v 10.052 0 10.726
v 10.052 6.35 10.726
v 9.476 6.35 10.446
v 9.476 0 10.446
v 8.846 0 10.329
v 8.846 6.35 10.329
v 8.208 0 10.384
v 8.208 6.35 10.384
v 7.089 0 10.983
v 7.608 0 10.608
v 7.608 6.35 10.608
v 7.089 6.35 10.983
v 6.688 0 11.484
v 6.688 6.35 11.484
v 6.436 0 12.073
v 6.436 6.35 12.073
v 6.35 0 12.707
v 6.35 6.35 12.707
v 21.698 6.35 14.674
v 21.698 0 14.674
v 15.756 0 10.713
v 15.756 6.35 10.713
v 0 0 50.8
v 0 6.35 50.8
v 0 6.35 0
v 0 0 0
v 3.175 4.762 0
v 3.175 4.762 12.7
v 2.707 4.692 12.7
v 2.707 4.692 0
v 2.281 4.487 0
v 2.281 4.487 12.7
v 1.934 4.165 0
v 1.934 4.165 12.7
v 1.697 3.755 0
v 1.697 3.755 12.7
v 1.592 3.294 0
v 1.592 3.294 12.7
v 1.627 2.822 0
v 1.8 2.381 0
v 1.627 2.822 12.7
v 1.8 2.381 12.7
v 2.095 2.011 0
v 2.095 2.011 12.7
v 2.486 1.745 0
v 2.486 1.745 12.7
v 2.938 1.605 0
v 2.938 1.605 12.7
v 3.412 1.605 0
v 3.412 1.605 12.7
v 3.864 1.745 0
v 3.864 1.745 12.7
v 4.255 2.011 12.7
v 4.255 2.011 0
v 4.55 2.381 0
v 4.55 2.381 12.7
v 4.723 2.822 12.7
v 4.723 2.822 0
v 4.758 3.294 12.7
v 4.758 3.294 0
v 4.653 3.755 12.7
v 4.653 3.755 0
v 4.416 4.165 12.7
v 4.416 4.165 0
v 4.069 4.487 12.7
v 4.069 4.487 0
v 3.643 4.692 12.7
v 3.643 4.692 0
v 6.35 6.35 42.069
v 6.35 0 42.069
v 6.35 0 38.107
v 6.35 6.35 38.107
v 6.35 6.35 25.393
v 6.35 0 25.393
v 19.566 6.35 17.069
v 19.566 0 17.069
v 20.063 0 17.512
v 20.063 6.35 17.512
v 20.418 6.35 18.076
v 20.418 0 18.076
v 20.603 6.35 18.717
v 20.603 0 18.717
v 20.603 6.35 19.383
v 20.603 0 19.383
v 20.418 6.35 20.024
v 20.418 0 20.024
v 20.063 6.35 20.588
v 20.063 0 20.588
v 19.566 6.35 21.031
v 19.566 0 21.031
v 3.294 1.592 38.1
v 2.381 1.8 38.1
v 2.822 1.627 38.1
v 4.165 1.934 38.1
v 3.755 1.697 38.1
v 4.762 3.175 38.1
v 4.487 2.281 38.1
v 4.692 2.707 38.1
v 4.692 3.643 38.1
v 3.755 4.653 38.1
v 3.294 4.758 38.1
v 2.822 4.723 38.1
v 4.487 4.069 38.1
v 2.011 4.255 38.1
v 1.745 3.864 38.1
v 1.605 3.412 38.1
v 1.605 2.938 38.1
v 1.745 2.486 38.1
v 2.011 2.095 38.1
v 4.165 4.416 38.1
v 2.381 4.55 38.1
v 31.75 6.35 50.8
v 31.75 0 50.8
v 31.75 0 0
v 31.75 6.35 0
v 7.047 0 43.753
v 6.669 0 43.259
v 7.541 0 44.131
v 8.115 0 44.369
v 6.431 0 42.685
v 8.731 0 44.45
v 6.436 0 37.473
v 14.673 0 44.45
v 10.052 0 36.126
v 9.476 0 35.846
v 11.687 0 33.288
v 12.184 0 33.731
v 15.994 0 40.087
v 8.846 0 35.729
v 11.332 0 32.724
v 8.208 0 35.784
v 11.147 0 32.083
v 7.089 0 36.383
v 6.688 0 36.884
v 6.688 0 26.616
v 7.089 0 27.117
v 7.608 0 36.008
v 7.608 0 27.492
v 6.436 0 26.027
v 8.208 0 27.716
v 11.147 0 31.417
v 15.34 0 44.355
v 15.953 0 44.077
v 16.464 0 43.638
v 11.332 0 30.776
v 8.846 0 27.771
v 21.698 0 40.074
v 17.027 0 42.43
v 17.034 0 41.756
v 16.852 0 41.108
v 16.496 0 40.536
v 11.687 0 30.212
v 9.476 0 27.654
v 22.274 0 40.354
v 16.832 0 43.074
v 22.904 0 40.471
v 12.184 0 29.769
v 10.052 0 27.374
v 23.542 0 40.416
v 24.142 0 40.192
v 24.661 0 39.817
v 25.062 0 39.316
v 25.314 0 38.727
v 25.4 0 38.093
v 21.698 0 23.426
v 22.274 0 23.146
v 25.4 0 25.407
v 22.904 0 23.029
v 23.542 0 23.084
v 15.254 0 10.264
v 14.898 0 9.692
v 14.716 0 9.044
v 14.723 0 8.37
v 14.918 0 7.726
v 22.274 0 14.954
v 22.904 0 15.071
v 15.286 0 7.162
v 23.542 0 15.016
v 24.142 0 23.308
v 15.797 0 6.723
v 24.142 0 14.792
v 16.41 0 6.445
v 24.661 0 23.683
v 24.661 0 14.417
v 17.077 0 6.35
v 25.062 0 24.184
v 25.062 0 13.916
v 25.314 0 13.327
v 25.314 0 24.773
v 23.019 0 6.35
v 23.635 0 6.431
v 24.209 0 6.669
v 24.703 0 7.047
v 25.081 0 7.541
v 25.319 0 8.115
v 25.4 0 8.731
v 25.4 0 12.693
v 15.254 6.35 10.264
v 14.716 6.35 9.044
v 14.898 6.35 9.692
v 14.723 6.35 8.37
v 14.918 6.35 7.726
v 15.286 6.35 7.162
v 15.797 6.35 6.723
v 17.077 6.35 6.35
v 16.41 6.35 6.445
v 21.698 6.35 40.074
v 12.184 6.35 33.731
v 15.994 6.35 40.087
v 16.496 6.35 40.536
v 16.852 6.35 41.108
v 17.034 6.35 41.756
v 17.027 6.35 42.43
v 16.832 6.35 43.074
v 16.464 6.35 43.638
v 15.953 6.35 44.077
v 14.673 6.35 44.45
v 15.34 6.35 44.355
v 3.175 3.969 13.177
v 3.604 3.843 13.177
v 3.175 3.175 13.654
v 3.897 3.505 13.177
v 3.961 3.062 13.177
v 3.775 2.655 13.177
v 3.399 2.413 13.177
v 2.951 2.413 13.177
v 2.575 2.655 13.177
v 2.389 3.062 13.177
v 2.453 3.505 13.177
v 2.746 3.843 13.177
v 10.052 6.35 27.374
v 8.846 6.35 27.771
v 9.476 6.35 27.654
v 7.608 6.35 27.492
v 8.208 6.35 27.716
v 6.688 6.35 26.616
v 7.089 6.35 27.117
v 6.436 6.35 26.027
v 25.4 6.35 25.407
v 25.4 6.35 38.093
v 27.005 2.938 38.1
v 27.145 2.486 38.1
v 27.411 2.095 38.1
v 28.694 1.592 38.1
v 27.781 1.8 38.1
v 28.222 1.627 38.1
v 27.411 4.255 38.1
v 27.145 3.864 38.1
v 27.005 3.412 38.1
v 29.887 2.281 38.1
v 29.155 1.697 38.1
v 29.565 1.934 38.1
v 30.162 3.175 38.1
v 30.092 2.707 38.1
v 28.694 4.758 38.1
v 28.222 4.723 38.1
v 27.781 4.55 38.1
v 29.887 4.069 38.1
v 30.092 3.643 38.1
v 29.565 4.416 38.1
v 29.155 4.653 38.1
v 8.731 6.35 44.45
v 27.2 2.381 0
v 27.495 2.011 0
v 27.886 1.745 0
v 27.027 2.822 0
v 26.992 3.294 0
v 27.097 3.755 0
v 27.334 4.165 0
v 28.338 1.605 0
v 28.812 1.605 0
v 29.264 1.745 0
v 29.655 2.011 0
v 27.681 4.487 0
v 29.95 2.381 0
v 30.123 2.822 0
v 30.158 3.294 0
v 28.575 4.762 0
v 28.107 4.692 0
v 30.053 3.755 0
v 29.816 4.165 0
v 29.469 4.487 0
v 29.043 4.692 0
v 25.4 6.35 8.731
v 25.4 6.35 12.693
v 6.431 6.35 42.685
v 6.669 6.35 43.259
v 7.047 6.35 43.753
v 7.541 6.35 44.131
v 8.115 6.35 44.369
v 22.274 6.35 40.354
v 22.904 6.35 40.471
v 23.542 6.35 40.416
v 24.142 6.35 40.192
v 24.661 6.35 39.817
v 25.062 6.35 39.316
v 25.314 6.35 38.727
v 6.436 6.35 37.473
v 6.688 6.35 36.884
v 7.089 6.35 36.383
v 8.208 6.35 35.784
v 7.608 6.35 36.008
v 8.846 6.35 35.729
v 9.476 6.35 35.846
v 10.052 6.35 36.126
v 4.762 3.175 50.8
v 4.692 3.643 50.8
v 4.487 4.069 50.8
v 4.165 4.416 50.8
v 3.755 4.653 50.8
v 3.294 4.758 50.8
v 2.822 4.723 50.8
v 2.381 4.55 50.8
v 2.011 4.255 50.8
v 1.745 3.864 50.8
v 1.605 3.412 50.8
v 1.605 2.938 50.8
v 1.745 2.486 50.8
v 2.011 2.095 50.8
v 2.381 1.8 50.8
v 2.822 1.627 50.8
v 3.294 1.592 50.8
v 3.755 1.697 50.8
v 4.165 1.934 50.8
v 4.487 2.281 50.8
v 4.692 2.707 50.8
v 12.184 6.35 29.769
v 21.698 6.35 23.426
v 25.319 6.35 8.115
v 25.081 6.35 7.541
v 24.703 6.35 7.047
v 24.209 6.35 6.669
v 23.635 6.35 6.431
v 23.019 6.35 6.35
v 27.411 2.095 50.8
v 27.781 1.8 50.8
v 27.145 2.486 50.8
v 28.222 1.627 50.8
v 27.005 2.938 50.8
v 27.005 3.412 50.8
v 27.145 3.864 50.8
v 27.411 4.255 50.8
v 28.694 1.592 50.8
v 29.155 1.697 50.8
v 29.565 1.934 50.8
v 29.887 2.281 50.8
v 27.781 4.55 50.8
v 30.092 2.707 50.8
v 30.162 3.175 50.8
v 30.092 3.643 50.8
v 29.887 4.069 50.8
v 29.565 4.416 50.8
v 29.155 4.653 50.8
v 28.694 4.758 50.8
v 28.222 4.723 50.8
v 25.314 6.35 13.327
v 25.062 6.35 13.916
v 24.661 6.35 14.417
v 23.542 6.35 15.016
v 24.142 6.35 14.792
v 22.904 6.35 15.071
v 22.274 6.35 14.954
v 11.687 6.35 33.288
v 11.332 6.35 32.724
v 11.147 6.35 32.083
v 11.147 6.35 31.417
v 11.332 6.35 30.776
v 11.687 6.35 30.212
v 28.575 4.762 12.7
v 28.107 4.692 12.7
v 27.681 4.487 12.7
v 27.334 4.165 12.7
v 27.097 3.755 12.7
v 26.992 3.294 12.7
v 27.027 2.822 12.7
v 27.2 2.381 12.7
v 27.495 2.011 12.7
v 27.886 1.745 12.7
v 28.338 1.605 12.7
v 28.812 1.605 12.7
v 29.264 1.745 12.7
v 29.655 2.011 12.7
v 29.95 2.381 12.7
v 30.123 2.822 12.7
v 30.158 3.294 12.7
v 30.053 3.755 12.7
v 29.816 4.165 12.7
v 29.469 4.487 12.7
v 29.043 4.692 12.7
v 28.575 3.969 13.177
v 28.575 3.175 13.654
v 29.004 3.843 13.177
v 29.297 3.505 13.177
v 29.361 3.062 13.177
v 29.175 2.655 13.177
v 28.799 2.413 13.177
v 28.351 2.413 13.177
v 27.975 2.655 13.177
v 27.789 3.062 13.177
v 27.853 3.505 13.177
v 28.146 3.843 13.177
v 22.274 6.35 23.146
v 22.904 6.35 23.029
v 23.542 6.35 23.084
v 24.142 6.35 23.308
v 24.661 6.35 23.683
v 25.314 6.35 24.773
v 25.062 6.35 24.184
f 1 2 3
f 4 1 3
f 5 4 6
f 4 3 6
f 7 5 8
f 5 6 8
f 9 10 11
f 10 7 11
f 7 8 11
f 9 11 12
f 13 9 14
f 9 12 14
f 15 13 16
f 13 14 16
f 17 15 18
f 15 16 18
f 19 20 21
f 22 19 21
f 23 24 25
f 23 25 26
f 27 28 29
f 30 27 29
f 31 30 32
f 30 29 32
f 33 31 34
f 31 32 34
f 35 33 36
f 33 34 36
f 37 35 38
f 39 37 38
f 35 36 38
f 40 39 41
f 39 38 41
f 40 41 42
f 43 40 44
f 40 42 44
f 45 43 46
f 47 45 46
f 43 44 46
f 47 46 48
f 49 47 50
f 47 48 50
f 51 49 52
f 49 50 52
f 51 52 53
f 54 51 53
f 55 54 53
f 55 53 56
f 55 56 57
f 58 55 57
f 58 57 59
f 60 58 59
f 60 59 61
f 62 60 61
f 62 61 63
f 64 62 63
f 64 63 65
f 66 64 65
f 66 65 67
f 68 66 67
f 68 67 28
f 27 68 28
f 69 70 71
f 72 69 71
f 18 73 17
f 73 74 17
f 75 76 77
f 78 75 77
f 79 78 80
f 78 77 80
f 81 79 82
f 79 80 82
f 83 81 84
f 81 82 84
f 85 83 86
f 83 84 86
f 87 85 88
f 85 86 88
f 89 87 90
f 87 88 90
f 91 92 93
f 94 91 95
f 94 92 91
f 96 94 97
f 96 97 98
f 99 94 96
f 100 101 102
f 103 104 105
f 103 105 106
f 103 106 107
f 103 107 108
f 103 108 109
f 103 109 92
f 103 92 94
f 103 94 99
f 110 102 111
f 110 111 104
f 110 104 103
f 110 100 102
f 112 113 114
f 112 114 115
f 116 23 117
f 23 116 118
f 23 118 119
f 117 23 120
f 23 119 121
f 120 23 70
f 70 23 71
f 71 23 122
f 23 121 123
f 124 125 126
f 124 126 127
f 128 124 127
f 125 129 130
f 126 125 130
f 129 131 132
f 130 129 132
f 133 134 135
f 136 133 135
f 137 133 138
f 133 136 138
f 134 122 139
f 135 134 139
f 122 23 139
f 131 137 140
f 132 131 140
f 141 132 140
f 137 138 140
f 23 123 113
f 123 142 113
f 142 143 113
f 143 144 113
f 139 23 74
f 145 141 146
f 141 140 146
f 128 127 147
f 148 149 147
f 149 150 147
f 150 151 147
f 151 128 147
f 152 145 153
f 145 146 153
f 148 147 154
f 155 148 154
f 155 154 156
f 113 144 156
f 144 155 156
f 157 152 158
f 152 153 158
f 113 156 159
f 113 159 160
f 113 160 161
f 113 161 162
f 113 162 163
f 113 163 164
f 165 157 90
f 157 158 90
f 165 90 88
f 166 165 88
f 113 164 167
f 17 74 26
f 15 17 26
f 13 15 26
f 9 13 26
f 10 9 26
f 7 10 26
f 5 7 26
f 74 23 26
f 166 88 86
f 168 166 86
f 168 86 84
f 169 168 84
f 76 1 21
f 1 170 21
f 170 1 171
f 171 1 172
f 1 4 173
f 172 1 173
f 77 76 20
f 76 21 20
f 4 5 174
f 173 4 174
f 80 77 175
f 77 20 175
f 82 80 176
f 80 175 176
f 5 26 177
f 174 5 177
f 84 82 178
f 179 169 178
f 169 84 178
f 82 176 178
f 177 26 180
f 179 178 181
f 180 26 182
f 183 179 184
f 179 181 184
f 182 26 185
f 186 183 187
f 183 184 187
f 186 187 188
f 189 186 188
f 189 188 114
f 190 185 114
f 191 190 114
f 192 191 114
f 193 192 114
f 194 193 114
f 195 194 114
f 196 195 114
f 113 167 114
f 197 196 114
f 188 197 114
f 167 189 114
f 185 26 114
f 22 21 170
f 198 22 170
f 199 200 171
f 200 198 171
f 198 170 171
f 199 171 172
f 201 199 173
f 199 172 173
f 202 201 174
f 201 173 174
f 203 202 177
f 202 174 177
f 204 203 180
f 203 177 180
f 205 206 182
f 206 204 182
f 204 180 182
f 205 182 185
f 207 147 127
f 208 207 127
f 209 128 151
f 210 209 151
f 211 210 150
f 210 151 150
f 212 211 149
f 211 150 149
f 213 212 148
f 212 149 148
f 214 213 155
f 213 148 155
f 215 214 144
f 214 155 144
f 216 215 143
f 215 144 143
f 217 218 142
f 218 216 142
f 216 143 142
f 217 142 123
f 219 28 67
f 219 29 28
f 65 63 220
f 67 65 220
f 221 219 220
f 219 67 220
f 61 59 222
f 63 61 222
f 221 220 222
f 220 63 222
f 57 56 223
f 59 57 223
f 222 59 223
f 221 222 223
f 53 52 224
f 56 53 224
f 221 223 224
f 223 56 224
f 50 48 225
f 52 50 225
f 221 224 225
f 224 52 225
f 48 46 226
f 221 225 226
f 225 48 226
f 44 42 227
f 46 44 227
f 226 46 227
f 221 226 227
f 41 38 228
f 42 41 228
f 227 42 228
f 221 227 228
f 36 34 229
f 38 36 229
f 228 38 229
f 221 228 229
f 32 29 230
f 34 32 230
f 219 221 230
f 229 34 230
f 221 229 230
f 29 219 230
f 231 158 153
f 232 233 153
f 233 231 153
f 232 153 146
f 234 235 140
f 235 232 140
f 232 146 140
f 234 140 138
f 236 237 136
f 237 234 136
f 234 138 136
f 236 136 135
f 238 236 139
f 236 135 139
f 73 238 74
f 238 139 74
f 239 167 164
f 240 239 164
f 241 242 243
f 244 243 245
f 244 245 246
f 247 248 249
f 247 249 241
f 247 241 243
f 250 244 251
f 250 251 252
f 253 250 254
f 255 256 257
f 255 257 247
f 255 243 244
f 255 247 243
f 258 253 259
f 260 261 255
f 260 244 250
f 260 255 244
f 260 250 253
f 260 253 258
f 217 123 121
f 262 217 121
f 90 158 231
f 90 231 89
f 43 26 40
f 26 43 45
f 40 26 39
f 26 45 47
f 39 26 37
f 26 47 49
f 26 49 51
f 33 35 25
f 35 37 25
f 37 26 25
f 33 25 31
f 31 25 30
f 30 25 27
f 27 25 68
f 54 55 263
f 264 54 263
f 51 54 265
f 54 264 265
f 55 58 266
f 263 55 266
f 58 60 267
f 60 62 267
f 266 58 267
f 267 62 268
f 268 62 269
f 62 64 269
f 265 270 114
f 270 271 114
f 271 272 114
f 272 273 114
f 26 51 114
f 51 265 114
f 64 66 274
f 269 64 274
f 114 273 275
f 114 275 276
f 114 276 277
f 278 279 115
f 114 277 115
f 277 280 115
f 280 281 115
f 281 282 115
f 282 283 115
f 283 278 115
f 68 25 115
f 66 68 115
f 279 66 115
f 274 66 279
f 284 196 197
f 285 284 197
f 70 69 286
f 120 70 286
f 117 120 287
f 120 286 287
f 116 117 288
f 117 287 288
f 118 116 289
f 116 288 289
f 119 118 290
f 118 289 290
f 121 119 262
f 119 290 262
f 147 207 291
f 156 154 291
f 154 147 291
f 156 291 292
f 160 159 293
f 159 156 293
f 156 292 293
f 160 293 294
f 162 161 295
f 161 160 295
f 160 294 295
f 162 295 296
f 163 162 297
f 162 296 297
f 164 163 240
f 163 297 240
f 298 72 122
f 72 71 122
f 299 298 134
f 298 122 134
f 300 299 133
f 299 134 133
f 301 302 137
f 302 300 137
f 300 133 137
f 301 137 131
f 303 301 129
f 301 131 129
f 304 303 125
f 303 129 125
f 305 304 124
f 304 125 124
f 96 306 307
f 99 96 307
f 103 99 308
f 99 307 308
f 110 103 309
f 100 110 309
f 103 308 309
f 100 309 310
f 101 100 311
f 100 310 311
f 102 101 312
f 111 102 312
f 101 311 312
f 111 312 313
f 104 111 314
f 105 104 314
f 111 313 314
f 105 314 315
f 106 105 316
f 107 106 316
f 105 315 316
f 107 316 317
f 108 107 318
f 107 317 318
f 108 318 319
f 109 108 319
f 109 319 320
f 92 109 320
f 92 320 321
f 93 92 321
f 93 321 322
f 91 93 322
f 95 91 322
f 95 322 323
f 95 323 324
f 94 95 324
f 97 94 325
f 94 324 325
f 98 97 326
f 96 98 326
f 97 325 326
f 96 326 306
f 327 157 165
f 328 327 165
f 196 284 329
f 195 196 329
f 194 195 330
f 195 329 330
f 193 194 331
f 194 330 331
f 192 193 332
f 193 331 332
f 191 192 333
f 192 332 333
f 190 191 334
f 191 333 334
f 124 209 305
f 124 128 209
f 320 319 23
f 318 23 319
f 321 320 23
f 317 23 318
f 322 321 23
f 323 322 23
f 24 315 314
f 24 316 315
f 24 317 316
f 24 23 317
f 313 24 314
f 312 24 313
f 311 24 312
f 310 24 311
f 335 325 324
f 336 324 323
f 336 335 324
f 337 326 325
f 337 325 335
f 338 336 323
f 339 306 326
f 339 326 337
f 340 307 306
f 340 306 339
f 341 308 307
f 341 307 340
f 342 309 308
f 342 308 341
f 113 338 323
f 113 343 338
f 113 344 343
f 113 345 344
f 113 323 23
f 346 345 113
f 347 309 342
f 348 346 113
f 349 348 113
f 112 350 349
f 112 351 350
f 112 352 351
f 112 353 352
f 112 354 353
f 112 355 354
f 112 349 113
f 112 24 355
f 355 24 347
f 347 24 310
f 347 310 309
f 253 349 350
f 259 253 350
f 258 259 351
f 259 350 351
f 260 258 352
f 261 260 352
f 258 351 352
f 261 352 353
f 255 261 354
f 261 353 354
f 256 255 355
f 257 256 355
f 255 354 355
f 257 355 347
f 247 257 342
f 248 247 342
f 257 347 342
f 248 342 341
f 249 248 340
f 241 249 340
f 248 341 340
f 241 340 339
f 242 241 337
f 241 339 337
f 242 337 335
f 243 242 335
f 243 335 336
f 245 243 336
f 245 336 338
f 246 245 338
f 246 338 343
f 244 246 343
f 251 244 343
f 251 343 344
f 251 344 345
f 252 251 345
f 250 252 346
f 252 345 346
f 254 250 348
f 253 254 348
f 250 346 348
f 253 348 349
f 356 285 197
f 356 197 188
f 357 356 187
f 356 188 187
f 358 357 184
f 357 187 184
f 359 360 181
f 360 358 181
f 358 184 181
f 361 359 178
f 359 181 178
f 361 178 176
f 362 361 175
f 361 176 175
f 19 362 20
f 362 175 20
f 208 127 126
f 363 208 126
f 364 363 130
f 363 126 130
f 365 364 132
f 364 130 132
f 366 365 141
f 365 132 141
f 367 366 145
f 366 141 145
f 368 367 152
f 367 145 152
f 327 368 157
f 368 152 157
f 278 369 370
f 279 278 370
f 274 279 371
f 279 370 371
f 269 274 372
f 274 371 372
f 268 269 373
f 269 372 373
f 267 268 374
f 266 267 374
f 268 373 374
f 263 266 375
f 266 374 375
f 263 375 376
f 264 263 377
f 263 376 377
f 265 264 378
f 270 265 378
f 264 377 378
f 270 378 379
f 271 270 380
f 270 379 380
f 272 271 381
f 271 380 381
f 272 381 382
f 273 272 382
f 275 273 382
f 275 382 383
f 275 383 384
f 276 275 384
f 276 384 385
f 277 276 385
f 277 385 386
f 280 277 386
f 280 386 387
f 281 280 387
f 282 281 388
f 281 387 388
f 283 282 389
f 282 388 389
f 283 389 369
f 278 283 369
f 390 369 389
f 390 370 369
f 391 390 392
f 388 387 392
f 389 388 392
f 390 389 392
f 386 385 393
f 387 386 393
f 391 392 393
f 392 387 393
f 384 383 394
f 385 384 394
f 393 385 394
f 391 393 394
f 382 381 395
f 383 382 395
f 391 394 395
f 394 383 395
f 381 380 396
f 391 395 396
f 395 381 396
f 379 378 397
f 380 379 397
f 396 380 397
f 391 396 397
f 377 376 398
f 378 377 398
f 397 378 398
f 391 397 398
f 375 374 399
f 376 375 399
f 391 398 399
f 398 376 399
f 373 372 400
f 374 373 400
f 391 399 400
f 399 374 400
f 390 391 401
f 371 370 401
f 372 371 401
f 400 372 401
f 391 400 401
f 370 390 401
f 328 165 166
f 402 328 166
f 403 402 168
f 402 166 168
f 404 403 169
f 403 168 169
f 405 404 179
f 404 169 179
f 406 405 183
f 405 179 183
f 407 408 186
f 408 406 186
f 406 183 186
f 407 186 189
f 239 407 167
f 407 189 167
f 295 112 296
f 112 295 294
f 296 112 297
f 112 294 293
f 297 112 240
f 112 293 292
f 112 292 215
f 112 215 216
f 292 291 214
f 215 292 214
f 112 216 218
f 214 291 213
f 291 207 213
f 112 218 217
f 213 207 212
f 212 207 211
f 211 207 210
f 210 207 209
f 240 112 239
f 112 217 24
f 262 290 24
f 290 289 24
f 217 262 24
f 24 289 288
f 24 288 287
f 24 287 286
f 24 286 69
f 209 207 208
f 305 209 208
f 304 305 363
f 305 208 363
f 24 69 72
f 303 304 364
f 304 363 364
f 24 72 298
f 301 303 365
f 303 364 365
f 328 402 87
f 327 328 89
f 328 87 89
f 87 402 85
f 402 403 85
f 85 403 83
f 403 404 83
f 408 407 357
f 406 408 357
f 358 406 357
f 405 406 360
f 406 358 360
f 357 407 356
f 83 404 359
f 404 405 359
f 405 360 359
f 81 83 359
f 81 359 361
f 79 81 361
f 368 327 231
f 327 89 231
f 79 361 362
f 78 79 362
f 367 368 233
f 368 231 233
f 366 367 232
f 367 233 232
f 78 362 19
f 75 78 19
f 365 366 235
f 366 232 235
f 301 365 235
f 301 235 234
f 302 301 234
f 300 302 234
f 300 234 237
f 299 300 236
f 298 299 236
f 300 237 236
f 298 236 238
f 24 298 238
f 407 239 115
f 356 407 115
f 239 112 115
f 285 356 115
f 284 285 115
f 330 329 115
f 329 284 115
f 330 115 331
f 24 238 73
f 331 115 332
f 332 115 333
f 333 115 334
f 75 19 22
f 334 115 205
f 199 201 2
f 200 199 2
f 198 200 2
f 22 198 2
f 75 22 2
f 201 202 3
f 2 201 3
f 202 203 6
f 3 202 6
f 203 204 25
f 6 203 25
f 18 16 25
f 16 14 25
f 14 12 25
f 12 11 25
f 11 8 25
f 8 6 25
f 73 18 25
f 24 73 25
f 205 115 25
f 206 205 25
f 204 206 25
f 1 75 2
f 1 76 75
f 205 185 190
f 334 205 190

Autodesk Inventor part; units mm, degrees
ref_plane "YZ Plane" through (0, 0, 0) normal (1, 0, 0) x (0, 1, 0)
ref_plane "XZ Plane" through (0, 0, 0) normal (0, 1, 0) x (-1, 0, 0)
sketch "Sketch1" plane through (0, 0, 0) normal (0, 0, 1) x (1, 0, 0)
  line L0 (0, 0) -> (31.75, 0)
  line L1 (31.75, 0) -> (31.75, 6.35)
  line L2 (31.75, 6.35) -> (0, 6.35)
  line L3 (0, 6.35) -> (0, 0)
  point P0 (3.175, 3.175)
  point P1 (28.575, 3.175)
  dimension "d0" = 6.35
  dimension "d1" = 31.75
  dimension "d4" = 3.175
  dimension "d5" = 3.175
  dimension "d6" = 3.175
  dimension "d8" = 3.175
extrude "Extrusion1" add sketch "Sketch1" along normal blind 50.8
sketch "Sketch2" plane through (0, 0, 50.8) normal (0, 0, 1) x (1, 0, 0)
  circle A0 centre (3.175, 3.175) radius 1.5875 projected
  circle A1 centre (28.575, 3.175) radius 1.5875 projected
ref_plane "Work Plane1" through (0, 3.175, 0) normal (0, 1, 0) x (1, 0, 0)
sketch "Sketch3" plane through (0, 3.175, 0) normal (0, 1, 0) x (1, 0, 0)
  line L0 (0, 0) -> (31.75, 0) projected
  line L1 (0, 0) -> (0, -50.8) projected
  line L2 (31.75, 0) -> (31.75, -50.8) projected
  line L3 (31.75, -50.8) -> (0, -50.8) projected
  line L4 (6.35, -6.35) -> (25.4, -6.35)
  line L5 (25.4, -6.35) -> (25.4, -44.45)
  line L6 (25.4, -44.45) -> (6.35, -44.45)
  line L7 (6.35, -44.45) -> (6.35, -6.35)
  line L8 (25.4, -44.45) -> (6.35, -31.75) construction
  line L9 (25.4, -19.05) -> (6.35, -6.35) construction
  line L10 (6.35, -31.75) -> (25.4, -19.05) construction
  line L11 (22.5381, -44.45) -> (6.35, -33.6579)
  line L12 (25.4, -42.5421) -> (9.2119, -31.75)
  line L13 (9.2119, -31.75) -> (25.4, -20.9579)
  line L14 (6.35, -29.8421) -> (22.5381, -19.05)
  line L15 (22.5381, -19.05) -> (6.35, -8.2579)
  line L16 (25.4, -17.1421) -> (9.2119, -6.35)
  point P0 (25.4, -15.6798)
  point P1 (6.35, -19.8802)
  point P2 (6.35, -8.0598)
  point P3 (10.6245, -6.35)
  point P4 (25.4, -12.2602)
  dimension "d27" = 6.35
  dimension "d28" = 6.35
  dimension "d29" = 6.35
  dimension "d30" = 6.35
  dimension "d31" = 33.69
  dimension "d32" = 67.38
  dimension "d33" = 1.5875
  dimension "d34" = 3.175
  dimension "d35" = 1.5875
  dimension "d36" = 3.175
  dimension "d37" = 1.5875
  dimension "d38" = 3.175
extrude "Extrusion4" cut sketch "Sketch3" along normal mid plane 25.4 contours L4 L5 L16 | L15 L14 L7 | L5 L12 L13 | L11 L6 L7
sketch "Sketch5" plane through (0, 6.35, 0) normal (0, 1, 0) x (1, 0, 0)
  line L0 (0, -50.8) -> (31.75, -50.8) projected
  line L1 (31.75, 0) -> (31.75, -50.8) projected
  line L2 (0, 0) -> (31.75, 0)
  line L3 (31.75, 0) -> (31.75, -6.35)
  line L4 (31.75, -6.35) -> (0, -6.35)
  line L5 (0, -6.35) -> (0, 0)
  line L6 (0, -6.35) -> (31.75, -6.35)
  line L7 (31.75, -6.35) -> (31.75, -44.45)
  line L8 (31.75, -44.45) -> (0, -44.45)
  line L9 (0, -44.45) -> (0, -6.35)
  line L10 (31.75, -44.45) -> (0, -44.45)
  line L11 (0, -44.45) -> (0, -50.8)
  line L12 (0, -50.8) -> (31.75, -50.8)
  line L13 (31.75, -50.8) -> (31.75, -44.45)
extrude "Extrusion6" cut sketch "Sketch5" against normal blind 1.5875 contours L9 L4 L1 L8
sketch "Sketch6" plane through (0, 0, 0) normal (0, -1, 0) x (1, 0, 0)
  line L0 (0, 0) -> (0, 50.8) projected
  line L1 (31.75, 0) -> (31.75, 50.8) projected
  line L2 (0, 50.8) -> (31.75, 50.8)
  line L3 (31.75, 50.8) -> (31.75, 44.45)
  line L4 (31.75, 44.45) -> (0, 44.45)
  line L5 (0, 44.45) -> (0, 50.8)
  line L6 (31.75, 44.45) -> (0, 44.45)
  line L7 (0, 44.45) -> (0, 6.35)
  line L8 (0, 6.35) -> (31.75, 6.35)
  line L9 (31.75, 6.35) -> (31.75, 44.45)
  line L10 (31.75, 0) -> (0, 0)
  line L11 (0, 0) -> (0, 6.35)
  line L12 (0, 6.35) -> (31.75, 6.35)
  line L13 (31.75, 6.35) -> (31.75, 0)
extrude "Extrusion8" cut sketch "Sketch6" against normal blind 1.5875 contours L0 L4 L1 L8
extrude "Extrusion11" add sketch "Sketch3" along normal mid plane 6.35 contours L0 L2 L3 L1 | L4 L16 L5 L13 L12 L6 L11 L7 L14 L15
fillet "Fillet7" radius 2.3813 12 edges at (25.4, 3.175, 17.1421) (22.5381, 3.175, 19.05) (25.4, 3.175, 20.9579) (25.4, 3.175, 42.5421) (22.5381, 3.175, 44.45) (6.35, 3.175, 44.45) (6.35, 3.175, 33.6579) (9.2119, 3.175, 31.75) (6.35, 3.175, 29.8421) (6.35, 3.175, 8.2579) (9.2119, 3.175, 6.35) (25.4, 3.175, 6.35)
extrude "Extrusion12" cut sketch "Sketch2" against normal blind 12.7
hole "Hole2" at (3.175, 3.175, 0) at (28.575, 3.175, 0) direction (0, 0, 1) diameter 3.175 depth 12.7 tip angle 118
thread "Thread5" size "5-40 UNC" class "2B" standard "ANSI Unified Screw Threads" full length
thread "Thread6" size "5-40 UNC" class "2B" standard "ANSI Unified Screw Threads" full length
thread "Thread7" size "5-40 UNC" class "2B" standard "ANSI Unified Screw Threads" full length
thread "Thread8" size "5-40 UNC" class "2B" standard "ANSI Unified Screw Threads" full length
equation "\"d5\" = d4"
equation "\"d8\" = d4"
equation "\"d28\" = d30"
equation "\"d29\" = d27"
equation "\"d30\" = d29"
equation "\"d32\" = 2 * d31"
equation "\"d34\" = 2 * d33"
equation "\"d35\" = d33"
equation "\"d36\" = d34"
equation "\"d37\" = d35"
equation "\"d38\" = d36"
properties part number "upper gearbox stand off standard"
